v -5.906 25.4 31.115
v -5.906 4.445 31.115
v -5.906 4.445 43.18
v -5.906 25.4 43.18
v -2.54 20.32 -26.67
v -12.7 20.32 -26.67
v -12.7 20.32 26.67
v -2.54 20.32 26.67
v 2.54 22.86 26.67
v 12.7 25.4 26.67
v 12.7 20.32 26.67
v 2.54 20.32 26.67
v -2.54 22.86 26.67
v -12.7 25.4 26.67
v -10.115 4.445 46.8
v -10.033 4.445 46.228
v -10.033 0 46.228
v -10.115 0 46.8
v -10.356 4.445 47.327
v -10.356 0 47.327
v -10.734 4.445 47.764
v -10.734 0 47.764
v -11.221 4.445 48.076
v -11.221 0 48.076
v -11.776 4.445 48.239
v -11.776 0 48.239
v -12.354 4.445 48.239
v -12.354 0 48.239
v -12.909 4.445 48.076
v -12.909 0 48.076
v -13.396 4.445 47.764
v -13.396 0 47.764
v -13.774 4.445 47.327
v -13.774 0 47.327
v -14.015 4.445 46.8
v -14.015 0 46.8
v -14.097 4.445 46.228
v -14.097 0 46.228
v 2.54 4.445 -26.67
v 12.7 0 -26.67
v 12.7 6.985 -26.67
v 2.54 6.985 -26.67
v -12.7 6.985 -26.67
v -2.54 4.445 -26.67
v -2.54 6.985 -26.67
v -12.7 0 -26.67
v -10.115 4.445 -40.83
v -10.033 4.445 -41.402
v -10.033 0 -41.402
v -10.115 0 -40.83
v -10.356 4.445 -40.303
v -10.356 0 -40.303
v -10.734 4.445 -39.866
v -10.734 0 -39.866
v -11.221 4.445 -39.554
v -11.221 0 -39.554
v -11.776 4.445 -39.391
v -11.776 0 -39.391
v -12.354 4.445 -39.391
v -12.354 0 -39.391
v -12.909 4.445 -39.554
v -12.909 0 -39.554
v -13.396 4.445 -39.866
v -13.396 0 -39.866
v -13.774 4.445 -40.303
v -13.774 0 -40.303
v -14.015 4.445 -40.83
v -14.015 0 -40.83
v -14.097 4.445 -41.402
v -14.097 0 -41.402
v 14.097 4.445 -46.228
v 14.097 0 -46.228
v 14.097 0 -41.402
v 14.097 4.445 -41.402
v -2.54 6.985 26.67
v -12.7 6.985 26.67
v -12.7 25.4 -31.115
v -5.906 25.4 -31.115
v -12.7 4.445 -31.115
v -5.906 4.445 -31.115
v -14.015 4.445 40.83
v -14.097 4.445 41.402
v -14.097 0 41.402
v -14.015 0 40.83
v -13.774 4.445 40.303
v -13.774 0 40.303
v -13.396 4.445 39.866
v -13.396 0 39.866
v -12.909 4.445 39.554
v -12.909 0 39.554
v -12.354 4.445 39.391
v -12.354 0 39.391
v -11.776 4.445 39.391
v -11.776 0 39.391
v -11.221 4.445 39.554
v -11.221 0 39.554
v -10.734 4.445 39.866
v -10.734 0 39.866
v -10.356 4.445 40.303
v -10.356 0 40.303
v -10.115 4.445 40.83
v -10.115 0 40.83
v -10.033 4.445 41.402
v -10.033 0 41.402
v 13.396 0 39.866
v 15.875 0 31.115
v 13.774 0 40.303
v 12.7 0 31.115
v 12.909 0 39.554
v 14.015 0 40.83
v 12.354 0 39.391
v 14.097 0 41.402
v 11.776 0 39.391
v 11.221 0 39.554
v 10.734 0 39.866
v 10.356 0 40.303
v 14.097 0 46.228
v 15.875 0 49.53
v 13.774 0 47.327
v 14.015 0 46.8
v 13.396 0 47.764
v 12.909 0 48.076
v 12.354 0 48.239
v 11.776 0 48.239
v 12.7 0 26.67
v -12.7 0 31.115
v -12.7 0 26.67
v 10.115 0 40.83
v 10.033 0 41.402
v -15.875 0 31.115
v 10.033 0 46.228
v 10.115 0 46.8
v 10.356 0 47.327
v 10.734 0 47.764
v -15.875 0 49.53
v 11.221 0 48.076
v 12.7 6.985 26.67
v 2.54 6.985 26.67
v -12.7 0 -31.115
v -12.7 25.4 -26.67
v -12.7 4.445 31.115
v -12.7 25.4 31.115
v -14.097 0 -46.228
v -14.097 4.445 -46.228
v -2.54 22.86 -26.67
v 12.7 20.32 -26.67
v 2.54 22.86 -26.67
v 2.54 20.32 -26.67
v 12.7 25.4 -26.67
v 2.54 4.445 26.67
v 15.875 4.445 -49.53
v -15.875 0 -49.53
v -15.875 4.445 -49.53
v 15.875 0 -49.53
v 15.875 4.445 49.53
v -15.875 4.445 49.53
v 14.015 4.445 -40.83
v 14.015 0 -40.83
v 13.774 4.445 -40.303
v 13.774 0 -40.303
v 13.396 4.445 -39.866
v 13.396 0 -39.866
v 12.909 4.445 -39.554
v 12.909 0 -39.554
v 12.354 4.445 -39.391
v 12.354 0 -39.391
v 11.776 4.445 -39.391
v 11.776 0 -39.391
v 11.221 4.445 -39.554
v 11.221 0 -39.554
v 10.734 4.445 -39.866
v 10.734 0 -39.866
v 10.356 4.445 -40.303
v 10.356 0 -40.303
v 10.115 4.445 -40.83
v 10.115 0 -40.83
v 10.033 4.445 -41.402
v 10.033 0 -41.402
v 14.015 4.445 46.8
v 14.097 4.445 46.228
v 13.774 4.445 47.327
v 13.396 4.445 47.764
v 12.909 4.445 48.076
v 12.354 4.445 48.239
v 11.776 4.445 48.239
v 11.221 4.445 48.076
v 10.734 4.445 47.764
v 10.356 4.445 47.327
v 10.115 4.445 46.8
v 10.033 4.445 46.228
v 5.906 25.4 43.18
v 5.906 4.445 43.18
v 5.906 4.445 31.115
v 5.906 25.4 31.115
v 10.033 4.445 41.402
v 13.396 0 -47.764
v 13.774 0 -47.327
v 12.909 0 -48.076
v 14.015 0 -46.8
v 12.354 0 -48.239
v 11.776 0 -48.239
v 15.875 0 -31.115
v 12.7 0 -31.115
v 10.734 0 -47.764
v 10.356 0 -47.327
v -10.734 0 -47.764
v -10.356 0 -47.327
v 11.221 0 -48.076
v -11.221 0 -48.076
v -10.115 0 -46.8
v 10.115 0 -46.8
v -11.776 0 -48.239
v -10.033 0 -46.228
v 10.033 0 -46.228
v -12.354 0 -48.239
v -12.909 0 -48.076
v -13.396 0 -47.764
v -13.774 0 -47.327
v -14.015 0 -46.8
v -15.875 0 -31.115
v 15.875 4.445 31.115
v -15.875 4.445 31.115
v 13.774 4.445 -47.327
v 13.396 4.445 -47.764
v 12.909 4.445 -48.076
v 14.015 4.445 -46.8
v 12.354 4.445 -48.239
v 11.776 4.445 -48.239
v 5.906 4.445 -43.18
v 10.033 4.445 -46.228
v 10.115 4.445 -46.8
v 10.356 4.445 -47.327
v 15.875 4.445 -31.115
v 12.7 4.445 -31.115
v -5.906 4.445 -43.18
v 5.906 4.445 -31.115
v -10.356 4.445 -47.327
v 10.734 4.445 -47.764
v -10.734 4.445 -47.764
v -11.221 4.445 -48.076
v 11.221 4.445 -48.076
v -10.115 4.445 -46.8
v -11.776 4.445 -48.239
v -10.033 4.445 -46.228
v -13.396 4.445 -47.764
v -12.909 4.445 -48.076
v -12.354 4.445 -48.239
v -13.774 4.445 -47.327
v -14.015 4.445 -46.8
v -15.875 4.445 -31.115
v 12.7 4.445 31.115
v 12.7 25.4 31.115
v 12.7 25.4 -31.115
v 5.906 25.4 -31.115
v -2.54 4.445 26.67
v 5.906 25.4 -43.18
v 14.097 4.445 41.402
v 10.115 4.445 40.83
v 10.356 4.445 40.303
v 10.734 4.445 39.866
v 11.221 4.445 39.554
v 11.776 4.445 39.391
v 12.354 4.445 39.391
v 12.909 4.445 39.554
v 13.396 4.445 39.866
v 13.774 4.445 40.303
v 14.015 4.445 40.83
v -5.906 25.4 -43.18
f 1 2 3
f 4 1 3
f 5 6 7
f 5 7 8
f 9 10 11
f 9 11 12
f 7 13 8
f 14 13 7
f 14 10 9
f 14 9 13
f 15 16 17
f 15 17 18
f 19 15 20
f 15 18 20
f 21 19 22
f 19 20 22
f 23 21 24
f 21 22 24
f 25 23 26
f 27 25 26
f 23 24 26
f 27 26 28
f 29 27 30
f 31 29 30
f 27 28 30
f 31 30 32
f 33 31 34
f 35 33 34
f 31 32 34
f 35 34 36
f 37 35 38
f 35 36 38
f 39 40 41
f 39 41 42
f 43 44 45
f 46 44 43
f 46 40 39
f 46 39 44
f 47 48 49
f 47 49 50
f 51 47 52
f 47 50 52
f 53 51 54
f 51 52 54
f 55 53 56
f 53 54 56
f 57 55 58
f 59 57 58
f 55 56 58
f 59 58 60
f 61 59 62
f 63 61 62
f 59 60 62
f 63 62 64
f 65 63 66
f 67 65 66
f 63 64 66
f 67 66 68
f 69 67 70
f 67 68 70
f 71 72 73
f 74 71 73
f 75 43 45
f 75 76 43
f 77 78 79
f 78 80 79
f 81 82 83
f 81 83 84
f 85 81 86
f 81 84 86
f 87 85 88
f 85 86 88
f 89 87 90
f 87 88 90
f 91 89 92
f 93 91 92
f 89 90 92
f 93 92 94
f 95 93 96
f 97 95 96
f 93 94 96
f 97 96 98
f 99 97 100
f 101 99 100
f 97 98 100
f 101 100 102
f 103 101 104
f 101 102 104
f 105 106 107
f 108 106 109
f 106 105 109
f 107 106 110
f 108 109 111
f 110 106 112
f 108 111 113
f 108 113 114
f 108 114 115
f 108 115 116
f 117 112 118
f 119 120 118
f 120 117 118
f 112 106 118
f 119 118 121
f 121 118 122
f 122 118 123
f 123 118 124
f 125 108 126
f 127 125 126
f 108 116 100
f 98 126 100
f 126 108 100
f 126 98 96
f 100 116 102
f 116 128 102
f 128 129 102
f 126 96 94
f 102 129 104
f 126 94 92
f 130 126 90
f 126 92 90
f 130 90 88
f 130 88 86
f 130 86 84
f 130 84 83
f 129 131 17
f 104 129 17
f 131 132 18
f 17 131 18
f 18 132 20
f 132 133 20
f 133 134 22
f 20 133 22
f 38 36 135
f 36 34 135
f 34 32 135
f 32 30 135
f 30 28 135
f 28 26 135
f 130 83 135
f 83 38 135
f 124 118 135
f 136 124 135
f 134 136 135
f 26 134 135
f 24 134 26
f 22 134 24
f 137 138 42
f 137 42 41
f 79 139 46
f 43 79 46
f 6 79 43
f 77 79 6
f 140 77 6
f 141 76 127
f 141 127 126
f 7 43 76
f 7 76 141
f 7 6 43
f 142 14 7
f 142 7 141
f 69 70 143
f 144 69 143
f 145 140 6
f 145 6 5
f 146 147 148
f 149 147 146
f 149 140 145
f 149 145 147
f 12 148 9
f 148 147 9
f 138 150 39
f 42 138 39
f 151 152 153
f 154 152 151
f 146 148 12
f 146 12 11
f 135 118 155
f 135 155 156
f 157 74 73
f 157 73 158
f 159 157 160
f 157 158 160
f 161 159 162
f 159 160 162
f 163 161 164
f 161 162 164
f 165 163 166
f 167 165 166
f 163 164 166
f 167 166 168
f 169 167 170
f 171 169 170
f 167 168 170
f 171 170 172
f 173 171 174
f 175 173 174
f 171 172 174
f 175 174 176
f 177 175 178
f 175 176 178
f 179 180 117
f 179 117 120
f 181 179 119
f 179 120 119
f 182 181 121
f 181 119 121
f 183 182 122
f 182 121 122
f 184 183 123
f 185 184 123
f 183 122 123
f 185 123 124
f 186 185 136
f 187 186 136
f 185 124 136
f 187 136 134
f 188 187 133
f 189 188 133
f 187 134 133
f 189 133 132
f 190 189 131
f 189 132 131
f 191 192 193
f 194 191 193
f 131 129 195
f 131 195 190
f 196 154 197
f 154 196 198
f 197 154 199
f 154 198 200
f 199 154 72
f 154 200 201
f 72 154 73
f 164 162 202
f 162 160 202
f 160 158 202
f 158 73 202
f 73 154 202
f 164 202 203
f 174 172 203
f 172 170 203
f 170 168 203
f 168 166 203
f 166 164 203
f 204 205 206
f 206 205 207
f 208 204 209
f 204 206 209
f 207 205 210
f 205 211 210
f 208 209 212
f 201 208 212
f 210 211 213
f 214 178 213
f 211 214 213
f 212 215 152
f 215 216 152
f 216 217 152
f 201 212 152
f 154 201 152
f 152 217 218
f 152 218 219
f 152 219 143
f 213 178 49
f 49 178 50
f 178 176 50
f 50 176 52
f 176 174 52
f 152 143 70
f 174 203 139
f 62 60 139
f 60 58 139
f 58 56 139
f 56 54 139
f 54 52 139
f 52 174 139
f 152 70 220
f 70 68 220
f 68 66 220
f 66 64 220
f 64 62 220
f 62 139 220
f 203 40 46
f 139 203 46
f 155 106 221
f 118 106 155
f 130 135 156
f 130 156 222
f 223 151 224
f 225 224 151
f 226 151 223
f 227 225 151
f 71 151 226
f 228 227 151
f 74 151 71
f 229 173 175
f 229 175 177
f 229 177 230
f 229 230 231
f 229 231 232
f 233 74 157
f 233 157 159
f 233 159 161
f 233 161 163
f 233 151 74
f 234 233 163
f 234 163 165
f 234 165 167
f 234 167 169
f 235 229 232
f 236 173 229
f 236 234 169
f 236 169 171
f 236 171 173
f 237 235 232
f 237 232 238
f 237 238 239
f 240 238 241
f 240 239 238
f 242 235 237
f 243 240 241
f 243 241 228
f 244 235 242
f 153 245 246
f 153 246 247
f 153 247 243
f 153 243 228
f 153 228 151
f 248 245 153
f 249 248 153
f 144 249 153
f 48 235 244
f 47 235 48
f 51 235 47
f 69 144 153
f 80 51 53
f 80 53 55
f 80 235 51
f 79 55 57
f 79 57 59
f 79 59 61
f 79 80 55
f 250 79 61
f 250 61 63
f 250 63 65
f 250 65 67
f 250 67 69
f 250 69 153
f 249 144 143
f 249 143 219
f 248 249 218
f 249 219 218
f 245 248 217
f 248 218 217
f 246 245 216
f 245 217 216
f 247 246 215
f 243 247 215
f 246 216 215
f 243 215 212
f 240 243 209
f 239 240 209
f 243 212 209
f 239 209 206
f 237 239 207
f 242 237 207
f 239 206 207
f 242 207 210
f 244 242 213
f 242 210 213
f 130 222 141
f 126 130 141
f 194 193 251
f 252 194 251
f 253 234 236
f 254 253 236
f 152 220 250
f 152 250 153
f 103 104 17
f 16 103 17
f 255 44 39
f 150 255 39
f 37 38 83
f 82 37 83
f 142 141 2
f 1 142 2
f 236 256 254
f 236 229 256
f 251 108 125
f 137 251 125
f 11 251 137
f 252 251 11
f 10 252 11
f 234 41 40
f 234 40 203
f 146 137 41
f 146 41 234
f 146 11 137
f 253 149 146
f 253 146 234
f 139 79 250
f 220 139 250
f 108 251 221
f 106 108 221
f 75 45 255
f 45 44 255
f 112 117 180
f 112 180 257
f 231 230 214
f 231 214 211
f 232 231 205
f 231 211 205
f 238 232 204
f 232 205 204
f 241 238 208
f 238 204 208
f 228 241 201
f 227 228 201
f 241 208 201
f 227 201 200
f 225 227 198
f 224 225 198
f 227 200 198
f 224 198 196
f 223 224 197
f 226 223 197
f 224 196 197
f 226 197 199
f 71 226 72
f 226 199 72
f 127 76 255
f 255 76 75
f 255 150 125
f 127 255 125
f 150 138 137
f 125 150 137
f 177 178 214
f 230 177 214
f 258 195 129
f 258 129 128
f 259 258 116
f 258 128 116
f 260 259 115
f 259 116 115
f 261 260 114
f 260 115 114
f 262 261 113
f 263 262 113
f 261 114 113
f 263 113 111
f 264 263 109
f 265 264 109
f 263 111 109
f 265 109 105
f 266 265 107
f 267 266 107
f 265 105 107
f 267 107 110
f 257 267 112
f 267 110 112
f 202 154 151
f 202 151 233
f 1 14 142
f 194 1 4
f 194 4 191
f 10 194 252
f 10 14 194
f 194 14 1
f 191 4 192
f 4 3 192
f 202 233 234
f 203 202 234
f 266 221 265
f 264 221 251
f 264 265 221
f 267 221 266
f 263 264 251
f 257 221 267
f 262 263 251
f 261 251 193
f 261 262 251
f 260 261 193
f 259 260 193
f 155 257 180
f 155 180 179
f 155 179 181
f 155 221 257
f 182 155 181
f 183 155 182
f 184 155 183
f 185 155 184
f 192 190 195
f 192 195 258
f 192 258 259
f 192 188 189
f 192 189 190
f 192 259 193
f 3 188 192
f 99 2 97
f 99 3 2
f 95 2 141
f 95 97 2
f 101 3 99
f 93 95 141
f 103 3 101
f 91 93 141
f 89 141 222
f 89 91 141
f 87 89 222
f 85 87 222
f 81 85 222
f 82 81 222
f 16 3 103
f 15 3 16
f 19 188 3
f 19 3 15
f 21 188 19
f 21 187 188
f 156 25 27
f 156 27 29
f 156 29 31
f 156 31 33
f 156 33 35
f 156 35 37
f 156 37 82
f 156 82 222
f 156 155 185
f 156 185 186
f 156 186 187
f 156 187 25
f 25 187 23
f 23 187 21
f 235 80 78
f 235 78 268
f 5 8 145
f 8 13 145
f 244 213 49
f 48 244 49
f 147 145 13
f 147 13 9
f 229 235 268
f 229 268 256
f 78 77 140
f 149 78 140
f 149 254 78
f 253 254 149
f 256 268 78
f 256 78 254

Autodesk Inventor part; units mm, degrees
ref_plane "YZ Plane" through (0, 0, 0) normal (1, 0, 0) x (0, 1, 0)
ref_plane "XZ Plane" through (0, 0, 0) normal (0, 1, 0) x (-1, 0, 0)
ref_plane "XY Plane" through (0, 0, 0) normal (0, 0, 1) x (1, 0, 0)
sketch "Sketch1" plane through (0, 0, 0) normal (0, 1, 0) x (-1, 0, 0)
  line L0 (-15.875, 49.53) -> (15.875, 49.53)
  line L1 (15.875, 49.53) -> (15.875, -49.53)
  line L2 (15.875, -49.53) -> (-15.875, -49.53)
  line L3 (-15.875, -49.53) -> (-15.875, 49.53)
  line L4 (-15.875, 49.53) -> (15.875, -49.53) construction
  line L5 (15.875, 49.53) -> (-15.875, -49.53) construction
  line L6 (15.875, -49.53) -> (15.875, -48.26)
  line L7 (15.875, -49.53) -> (17.145, -49.53) construction
  line L8 (15.875, 49.53) -> (15.875, 48.26)
  line L9 (15.875, 49.53) -> (17.145, 49.53) construction
  line L10 (15.875, -49.53) -> (14.097, -49.53)
  line L11 (-15.875, -49.53) -> (-14.097, -49.53)
  line L12 (15.875, -49.53) -> (15.875, -39.37)
  line L13 (15.875, 49.53) -> (15.875, 39.37)
  line L14 (14.097, 49.53) -> (12.065, 49.53)
  line L15 (-14.097, 49.53) -> (-12.065, 49.53)
  line L16 (-12.065, -39.37) -> (-12.065, -48.26) construction
  line L17 (-10.033, -41.402) -> (-10.033, -46.228)
  line L18 (-14.097, -46.228) -> (-14.097, -41.402)
  arc A0 (-10.033, -41.402) -> (-14.097, -41.402) centre (-12.065, -41.402) ccw
  arc A1 (-14.097, -46.228) -> (-10.033, -46.228) centre (-12.065, -46.228) ccw
  line L19 (12.065, -48.26) -> (12.065, -39.37) construction
  line L20 (10.033, -46.228) -> (10.033, -41.402)
  line L21 (14.097, -41.402) -> (14.097, -46.228)
  arc A2 (10.033, -46.228) -> (14.097, -46.228) centre (12.065, -46.228) ccw
  arc A3 (14.097, -41.402) -> (10.033, -41.402) centre (12.065, -41.402) ccw
  line L22 (12.065, 39.37) -> (12.065, 48.26) construction
  line L23 (10.033, 41.402) -> (10.033, 46.228)
  line L24 (14.097, 46.228) -> (14.097, 41.402)
  arc A4 (10.033, 41.402) -> (14.097, 41.402) centre (12.065, 41.402) ccw
  arc A5 (14.097, 46.228) -> (10.033, 46.228) centre (12.065, 46.228) ccw
  line L25 (-12.065, 39.37) -> (-12.065, 48.26) construction
  line L26 (-10.033, 41.402) -> (-10.033, 46.228)
  line L27 (-14.097, 46.228) -> (-14.097, 41.402)
  arc A6 (-14.097, 41.402) -> (-10.033, 41.402) centre (-12.065, 41.402) ccw
  arc A7 (-10.033, 46.228) -> (-14.097, 46.228) centre (-12.065, 46.228) ccw
  line L28 (-12.065, 49.53) -> (-12.065, 37.6428)
  line L29 (-12.065, -37.6428) -> (-12.065, -49.53)
  line L30 (-14.097, -49.53) -> (-14.097, -39.37)
  line L31 (-14.097, 39.37) -> (-14.097, 49.53)
  line L32 (12.065, 49.53) -> (12.065, 37.6428)
  line L33 (12.065, -37.6428) -> (12.065, -49.53)
  line L34 (14.097, -49.53) -> (14.097, -39.37)
  line L35 (14.097, 39.37) -> (14.097, 49.53)
  line L36 (15.875, 39.37) -> (12.065, 39.37)
  line L37 (-12.065, 39.37) -> (-15.875, 39.37)
  line L38 (15.875, 48.26) -> (12.065, 48.26)
  line L39 (-12.065, 48.26) -> (-15.875, 48.26)
  line L40 (15.875, -39.37) -> (12.065, -39.37)
  line L41 (-12.065, -39.37) -> (-15.875, -39.37)
  line L42 (15.875, -48.26) -> (12.065, -48.26)
  line L43 (-12.065, -48.26) -> (-15.875, -48.26)
  point P0 (0, 0)
  point P1 (-12.065, -43.815)
  point P2 (12.065, -43.815)
  point P3 (12.065, 43.815)
  point P4 (-12.065, 43.815)
  dimension "d0" = 31.75
  dimension "d1" = 99.06
  dimension "d2" = 1.27
  dimension "d3" = 90
  dimension "d4" = 1.27
  dimension "d5" = 90
  dimension "d6" = 1.778
  dimension "d8" = 1.778
  dimension "d10" = 10.16
  dimension "d11" = 10.16
  dimension "d12" = 2.032
  dimension "d13" = 2.032
extrude "Extrusion1" add sketch "Sketch1" along normal blind 4.445 contours L0 L31 L39 L3 | L0 L28 L39 L31 | L39 L31 L27 L37 L3 | L0 L32 A5 L23 A4 L36 L1 L40 A3 L20 A2 L33 L2 L29 A1 L17 A0 L41 L3 L37 A6 L26 A7 L28 | L39 A7 L31 | L0 L35 L38 L32 | L41 L30 L18 L43 L3 | L31 A6 L37 | L0 L1 L38 L35 | L38 L35 A5 | L43 L30 L2 L3 | L41 A0 L30 | L38 L1 L36 L35 L24 | A4 L35 L36 | L43 L29 L2 L30 | L30 A1 L43 | L1 L42 L34 L21 L40 | L33 L42 L34 L2 | L1 L2 L34 L42 | L34 A3 L40 | A2 L34 L42
sketch "Sketch2" plane through (0, 4.445, 0) normal (0, 1, 0) x (1, 0, 0)
  line L0 (15.875, -49.53) -> (15.875, 49.53) projected
  line L1 (-15.875, -31.115) -> (15.875, -31.115)
  line L2 (15.875, -31.115) -> (15.875, 31.115)
  line L3 (15.875, 31.115) -> (-15.875, 31.115)
  line L4 (-15.875, 31.115) -> (-15.875, -31.115)
  line L5 (-15.875, -31.115) -> (15.875, 31.115) construction
  line L6 (15.875, -31.115) -> (-15.875, 31.115) construction
  line L7 (-12.7, -31.115) -> (12.7, -31.115)
  line L8 (12.7, -31.115) -> (12.7, 31.115)
  line L9 (12.7, 31.115) -> (-12.7, 31.115)
  line L10 (-12.7, 31.115) -> (-12.7, -31.115)
  line L11 (-12.7, -31.115) -> (12.7, 31.115) construction
  line L12 (12.7, -31.115) -> (-12.7, 31.115) construction
  line L13 (-12.7, -26.67) -> (12.7, -26.67)
  line L14 (12.7, -26.67) -> (12.7, 26.67)
  line L15 (12.7, 26.67) -> (-12.7, 26.67)
  line L16 (-12.7, 26.67) -> (-12.7, -26.67)
  line L17 (-12.7, -26.67) -> (12.7, 26.67) construction
  line L18 (12.7, -26.67) -> (-12.7, 26.67) construction
  point P0 (0, 0)
  dimension "d16" = 62.23
  dimension "d19" = 25.4
  dimension "d20" = 53.34
extrude "Extrusion2" cut sketch "Sketch2" against normal blind 4.445 contours L1 L8 L3 L0 | L1 L4 L3 L10 | L13 L10 L15 L8
sketch "Sketch3" plane through (0, 4.445, 0) normal (0, 1, 0) x (1, 0, 0)
  line L0 (12.7, 31.115) -> (12.7, 26.67) projected
  line L1 (-12.7, -31.115) -> (12.7, -31.115)
  line L2 (12.7, -31.115) -> (12.7, 31.115)
  line L3 (12.7, 31.115) -> (-12.7, 31.115)
  line L4 (-12.7, 31.115) -> (-12.7, -31.115)
  line L5 (-12.7, -31.115) -> (12.7, 31.115) construction
  line L6 (12.7, -31.115) -> (-12.7, 31.115) construction
  line L7 (15.875, 49.53) -> (-15.875, 49.53) projected
  line L8 (0, 49.53) -> (0, -49.53)
  line L9 (-15.875, -49.53) -> (15.875, -49.53) projected
  line L10 (0, 26.67) -> (0, 34.925)
  line L11 (12.7, -26.67) -> (-12.7, -26.67) projected
  line L12 (0, -26.67) -> (0, -34.925)
  line L13 (-12.7, 26.67) -> (12.7, 26.67) projected
  line L14 (-5.9055, 43.18) -> (5.9055, 43.18)
  line L15 (5.9055, 43.18) -> (5.9055, 26.67)
  line L16 (5.9055, 26.67) -> (-5.9055, 26.67)
  line L17 (-5.9055, 26.67) -> (-5.9055, 43.18)
  line L18 (-5.9055, 43.18) -> (5.9055, 26.67) construction
  line L19 (5.9055, 43.18) -> (-5.9055, 26.67) construction
  line L20 (-5.9055, -43.18) -> (5.9055, -43.18)
  line L21 (5.9055, -43.18) -> (5.9055, -26.67)
  line L22 (5.9055, -26.67) -> (-5.9055, -26.67)
  line L23 (-5.9055, -26.67) -> (-5.9055, -43.18)
  line L24 (-5.9055, -43.18) -> (5.9055, -26.67) construction
  line L25 (5.9055, -43.18) -> (-5.9055, -26.67) construction
  point P0 (0, 0)
  point P1 (-5.9055, -31.115)
  point P2 (5.9055, -31.115)
  point P3 (-5.9055, 31.115)
  point P4 (5.9055, 31.115)
  dimension "d23" = 8.255
  dimension "d24" = 8.255
  dimension "d25" = 11.811
extrude "Extrusion3" add sketch "Sketch3" along normal blind 20.955
sketch "Sketch4" plane through (0, 25.4, 0) normal (0, 1, 0) x (1, 0, 0)
  line L0 (12.7, -26.67) -> (-12.7, -26.67) projected
  line L1 (-12.7, 26.67) -> (12.7, 26.67)
  line L2 (12.7, 26.67) -> (12.7, -26.67)
  line L3 (12.7, -26.67) -> (-12.7, -26.67)
  line L4 (-12.7, -26.67) -> (-12.7, 26.67)
  line L5 (-12.7, 26.67) -> (12.7, -26.67) construction
  line L6 (12.7, 26.67) -> (-12.7, -26.67) construction
  point P0 (0, 0)
extrude "Extrusion4" cut sketch "Sketch4" against normal blind 2.54
sketch "Sketch5" plane through (0, 22.86, 0) normal (0, 1, 0) x (1, 0, 0)
  line L0 (12.7, -26.67) -> (12.7, 26.67) projected
  line L1 (-12.7, 26.67) -> (12.7, 26.67)
  line L2 (12.7, 26.67) -> (12.7, -26.67)
  line L3 (12.7, -26.67) -> (-12.7, -26.67)
  line L4 (-12.7, -26.67) -> (-12.7, 26.67)
  line L5 (-12.7, 26.67) -> (12.7, -26.67) construction
  line L6 (12.7, 26.67) -> (-12.7, -26.67) construction
  line L7 (-2.54, 26.67) -> (2.54, 26.67)
  line L8 (2.54, 26.67) -> (2.54, -26.67)
  line L9 (2.54, -26.67) -> (-2.54, -26.67)
  line L10 (-2.54, -26.67) -> (-2.54, 26.67)
  line L11 (-2.54, 26.67) -> (2.54, -26.67) construction
  line L12 (2.54, 26.67) -> (-2.54, -26.67) construction
  point P0 (0, 0)
  dimension "d28" = 5.08
extrude "Extrusion5" cut sketch "Sketch5" against normal blind 2.54 contours L3 L8 L1 L0 | L3 L4 L1 L10
sketch "Sketch6" plane through (0, 4.445, 0) normal (0, -1, 0) x (1, 0, 0)
  line L0 (12.7, -26.67) -> (12.7, 26.67) projected
  line L1 (-12.7, 26.67) -> (12.7, 26.67)
  line L2 (12.7, 26.67) -> (12.7, -26.67)
  line L3 (12.7, -26.67) -> (-12.7, -26.67)
  line L4 (-12.7, -26.67) -> (-12.7, 26.67)
  line L5 (-12.7, 26.67) -> (12.7, -26.67) construction
  line L6 (12.7, 26.67) -> (-12.7, -26.67) construction
  line L7 (-2.54, 26.67) -> (2.54, 26.67)
  line L8 (2.54, 26.67) -> (2.54, -26.67)
  line L9 (2.54, -26.67) -> (-2.54, -26.67)
  line L10 (-2.54, -26.67) -> (-2.54, 26.67)
  line L11 (-2.54, 26.67) -> (2.54, -26.67) construction
  line L12 (2.54, 26.67) -> (-2.54, -26.67) construction
  point P0 (0, 0)
  dimension "d31" = 5.08
extrude "Extrusion6" cut sketch "Sketch6" against normal blind 2.54 contours L3 L8 L1 L0 | L3 L4 L1 L10
equation "\"d17\" = d14"
equation "\"d14\" = 4.445"
properties part number "12v_heater_mount"
